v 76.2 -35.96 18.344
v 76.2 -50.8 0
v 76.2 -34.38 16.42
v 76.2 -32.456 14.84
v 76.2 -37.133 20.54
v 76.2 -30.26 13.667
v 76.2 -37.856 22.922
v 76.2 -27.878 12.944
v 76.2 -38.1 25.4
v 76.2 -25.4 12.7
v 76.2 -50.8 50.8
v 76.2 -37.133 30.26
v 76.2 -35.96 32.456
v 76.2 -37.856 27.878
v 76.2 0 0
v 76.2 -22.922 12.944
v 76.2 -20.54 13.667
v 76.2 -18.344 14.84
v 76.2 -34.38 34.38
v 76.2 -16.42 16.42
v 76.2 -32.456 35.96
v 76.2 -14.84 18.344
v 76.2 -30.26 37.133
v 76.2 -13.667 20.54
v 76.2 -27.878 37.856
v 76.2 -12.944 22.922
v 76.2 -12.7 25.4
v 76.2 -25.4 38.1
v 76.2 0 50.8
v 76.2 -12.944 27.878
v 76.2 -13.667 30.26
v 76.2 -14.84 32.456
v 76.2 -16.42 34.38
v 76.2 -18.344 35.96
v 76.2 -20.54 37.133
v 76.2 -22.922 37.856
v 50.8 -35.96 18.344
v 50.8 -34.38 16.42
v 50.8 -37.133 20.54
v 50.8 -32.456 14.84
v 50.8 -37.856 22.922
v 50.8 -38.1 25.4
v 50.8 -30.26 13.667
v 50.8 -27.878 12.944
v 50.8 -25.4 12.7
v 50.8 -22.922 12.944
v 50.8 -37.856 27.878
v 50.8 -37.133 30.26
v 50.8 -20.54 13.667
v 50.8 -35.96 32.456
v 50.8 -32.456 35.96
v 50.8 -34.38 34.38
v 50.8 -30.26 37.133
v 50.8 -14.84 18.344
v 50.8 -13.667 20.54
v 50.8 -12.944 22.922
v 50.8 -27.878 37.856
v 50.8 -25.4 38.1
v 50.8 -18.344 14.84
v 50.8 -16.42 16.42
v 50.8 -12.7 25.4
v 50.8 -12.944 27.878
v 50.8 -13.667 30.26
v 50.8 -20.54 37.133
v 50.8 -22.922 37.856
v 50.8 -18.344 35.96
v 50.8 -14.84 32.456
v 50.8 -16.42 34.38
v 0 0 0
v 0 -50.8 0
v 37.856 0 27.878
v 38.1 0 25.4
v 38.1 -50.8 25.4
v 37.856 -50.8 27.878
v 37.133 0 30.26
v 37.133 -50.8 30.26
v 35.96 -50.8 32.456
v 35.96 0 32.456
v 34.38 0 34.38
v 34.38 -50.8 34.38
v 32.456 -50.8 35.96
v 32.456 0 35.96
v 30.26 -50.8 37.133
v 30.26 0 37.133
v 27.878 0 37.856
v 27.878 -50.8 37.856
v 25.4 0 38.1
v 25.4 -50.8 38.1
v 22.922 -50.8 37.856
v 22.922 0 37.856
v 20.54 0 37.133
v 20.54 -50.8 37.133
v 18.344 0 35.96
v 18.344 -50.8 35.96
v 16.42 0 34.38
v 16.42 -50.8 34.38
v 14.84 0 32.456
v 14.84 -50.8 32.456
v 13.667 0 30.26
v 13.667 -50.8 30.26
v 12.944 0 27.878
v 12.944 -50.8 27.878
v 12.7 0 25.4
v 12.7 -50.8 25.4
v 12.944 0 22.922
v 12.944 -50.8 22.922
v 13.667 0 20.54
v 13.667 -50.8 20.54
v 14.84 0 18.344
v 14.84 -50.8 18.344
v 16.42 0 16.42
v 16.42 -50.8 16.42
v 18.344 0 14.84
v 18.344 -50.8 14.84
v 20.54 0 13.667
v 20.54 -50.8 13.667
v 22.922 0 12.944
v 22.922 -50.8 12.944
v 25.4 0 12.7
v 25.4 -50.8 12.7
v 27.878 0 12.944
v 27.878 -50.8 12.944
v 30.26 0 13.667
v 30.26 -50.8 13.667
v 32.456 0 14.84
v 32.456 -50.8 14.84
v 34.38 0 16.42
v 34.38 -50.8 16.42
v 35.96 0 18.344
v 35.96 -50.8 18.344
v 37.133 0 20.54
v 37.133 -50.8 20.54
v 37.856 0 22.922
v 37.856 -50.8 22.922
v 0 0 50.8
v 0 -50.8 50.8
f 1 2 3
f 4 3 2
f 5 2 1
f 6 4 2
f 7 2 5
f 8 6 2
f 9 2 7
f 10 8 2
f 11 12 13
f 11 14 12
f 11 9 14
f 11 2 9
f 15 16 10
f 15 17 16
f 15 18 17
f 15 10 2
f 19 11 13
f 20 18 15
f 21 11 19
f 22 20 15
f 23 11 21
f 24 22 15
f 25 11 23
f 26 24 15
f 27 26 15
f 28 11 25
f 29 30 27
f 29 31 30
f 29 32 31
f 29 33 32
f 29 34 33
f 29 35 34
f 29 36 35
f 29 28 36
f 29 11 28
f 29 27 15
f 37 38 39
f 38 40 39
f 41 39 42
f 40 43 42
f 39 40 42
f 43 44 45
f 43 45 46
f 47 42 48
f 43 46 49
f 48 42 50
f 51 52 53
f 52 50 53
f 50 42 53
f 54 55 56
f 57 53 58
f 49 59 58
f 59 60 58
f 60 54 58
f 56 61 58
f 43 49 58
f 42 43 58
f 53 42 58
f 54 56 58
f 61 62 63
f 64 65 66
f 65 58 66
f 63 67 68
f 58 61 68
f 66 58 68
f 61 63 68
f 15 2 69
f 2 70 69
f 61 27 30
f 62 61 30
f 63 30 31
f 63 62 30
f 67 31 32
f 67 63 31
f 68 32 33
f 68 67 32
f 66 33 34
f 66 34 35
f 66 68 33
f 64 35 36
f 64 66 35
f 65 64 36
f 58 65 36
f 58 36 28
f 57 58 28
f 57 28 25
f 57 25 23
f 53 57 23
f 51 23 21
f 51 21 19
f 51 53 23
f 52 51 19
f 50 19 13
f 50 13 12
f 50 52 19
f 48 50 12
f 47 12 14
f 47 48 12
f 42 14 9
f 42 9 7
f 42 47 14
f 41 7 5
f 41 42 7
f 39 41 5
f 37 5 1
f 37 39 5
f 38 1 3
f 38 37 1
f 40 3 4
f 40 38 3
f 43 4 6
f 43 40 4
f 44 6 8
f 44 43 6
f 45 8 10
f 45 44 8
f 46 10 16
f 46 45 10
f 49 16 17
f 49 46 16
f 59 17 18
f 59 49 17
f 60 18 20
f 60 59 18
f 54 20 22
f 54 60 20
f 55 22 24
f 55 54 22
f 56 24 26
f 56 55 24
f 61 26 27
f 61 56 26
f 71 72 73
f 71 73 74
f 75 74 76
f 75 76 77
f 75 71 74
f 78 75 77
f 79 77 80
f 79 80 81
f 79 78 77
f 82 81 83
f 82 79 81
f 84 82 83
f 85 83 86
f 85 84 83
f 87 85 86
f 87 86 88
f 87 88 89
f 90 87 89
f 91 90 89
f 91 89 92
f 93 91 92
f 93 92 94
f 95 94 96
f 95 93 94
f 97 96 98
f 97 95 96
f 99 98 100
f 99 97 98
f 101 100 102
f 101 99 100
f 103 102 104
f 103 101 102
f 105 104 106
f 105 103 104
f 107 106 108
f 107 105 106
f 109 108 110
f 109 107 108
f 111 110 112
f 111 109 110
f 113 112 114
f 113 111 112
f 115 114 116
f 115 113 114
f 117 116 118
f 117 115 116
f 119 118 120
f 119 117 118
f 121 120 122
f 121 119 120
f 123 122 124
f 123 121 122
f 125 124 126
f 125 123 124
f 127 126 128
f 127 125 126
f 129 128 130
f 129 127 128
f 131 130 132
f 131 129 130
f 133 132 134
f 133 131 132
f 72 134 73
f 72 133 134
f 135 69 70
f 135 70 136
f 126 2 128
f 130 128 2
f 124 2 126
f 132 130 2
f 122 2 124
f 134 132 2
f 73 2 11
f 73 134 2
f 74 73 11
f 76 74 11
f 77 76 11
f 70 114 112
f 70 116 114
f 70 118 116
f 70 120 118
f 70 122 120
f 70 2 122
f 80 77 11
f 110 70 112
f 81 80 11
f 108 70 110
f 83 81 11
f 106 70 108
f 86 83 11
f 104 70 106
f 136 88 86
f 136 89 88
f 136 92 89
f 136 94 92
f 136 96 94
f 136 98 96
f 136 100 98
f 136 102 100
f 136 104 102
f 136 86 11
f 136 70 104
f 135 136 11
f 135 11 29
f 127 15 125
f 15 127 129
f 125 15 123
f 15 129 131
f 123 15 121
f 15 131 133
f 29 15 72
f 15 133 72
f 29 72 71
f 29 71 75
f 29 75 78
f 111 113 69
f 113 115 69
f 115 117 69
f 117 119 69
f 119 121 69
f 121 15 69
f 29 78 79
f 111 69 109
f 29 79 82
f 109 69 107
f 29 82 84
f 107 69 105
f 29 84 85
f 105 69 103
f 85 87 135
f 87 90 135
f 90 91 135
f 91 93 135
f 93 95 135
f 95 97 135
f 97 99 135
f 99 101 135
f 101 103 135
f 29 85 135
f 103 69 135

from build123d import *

# Parameters (mm, degrees)
F0_W     = 50.8
F0_H     = 50.8
F0_R     = 12.7
F1_DEPTH = 50.8
F2_W     = 50.8
F2_H     = 50.8
F2_R     = 12.7
F3_DEPTH = 25.4


with BuildPart() as f1:
    # F0 (on Front) → F1 (new body)
    with BuildSketch(Plane.XZ):
        with Locations((25.4, 25.4)):
            Rectangle(F0_W, F0_H)
        with Locations((25.4, 25.4)):
            Circle(F0_R, mode=Mode.SUBTRACT)
    extrude(amount=F1_DEPTH)

    # F2 (on face) → F3 (join)
    with BuildSketch(Plane.YZ.offset(50.8)):
        with Locations((-25.4, 25.4)):
            Rectangle(F2_W, F2_H)
        with Locations((-25.4, 25.4)):
            Circle(F2_R, mode=Mode.SUBTRACT)
    extrude(amount=F3_DEPTH)


solid = f1.part
